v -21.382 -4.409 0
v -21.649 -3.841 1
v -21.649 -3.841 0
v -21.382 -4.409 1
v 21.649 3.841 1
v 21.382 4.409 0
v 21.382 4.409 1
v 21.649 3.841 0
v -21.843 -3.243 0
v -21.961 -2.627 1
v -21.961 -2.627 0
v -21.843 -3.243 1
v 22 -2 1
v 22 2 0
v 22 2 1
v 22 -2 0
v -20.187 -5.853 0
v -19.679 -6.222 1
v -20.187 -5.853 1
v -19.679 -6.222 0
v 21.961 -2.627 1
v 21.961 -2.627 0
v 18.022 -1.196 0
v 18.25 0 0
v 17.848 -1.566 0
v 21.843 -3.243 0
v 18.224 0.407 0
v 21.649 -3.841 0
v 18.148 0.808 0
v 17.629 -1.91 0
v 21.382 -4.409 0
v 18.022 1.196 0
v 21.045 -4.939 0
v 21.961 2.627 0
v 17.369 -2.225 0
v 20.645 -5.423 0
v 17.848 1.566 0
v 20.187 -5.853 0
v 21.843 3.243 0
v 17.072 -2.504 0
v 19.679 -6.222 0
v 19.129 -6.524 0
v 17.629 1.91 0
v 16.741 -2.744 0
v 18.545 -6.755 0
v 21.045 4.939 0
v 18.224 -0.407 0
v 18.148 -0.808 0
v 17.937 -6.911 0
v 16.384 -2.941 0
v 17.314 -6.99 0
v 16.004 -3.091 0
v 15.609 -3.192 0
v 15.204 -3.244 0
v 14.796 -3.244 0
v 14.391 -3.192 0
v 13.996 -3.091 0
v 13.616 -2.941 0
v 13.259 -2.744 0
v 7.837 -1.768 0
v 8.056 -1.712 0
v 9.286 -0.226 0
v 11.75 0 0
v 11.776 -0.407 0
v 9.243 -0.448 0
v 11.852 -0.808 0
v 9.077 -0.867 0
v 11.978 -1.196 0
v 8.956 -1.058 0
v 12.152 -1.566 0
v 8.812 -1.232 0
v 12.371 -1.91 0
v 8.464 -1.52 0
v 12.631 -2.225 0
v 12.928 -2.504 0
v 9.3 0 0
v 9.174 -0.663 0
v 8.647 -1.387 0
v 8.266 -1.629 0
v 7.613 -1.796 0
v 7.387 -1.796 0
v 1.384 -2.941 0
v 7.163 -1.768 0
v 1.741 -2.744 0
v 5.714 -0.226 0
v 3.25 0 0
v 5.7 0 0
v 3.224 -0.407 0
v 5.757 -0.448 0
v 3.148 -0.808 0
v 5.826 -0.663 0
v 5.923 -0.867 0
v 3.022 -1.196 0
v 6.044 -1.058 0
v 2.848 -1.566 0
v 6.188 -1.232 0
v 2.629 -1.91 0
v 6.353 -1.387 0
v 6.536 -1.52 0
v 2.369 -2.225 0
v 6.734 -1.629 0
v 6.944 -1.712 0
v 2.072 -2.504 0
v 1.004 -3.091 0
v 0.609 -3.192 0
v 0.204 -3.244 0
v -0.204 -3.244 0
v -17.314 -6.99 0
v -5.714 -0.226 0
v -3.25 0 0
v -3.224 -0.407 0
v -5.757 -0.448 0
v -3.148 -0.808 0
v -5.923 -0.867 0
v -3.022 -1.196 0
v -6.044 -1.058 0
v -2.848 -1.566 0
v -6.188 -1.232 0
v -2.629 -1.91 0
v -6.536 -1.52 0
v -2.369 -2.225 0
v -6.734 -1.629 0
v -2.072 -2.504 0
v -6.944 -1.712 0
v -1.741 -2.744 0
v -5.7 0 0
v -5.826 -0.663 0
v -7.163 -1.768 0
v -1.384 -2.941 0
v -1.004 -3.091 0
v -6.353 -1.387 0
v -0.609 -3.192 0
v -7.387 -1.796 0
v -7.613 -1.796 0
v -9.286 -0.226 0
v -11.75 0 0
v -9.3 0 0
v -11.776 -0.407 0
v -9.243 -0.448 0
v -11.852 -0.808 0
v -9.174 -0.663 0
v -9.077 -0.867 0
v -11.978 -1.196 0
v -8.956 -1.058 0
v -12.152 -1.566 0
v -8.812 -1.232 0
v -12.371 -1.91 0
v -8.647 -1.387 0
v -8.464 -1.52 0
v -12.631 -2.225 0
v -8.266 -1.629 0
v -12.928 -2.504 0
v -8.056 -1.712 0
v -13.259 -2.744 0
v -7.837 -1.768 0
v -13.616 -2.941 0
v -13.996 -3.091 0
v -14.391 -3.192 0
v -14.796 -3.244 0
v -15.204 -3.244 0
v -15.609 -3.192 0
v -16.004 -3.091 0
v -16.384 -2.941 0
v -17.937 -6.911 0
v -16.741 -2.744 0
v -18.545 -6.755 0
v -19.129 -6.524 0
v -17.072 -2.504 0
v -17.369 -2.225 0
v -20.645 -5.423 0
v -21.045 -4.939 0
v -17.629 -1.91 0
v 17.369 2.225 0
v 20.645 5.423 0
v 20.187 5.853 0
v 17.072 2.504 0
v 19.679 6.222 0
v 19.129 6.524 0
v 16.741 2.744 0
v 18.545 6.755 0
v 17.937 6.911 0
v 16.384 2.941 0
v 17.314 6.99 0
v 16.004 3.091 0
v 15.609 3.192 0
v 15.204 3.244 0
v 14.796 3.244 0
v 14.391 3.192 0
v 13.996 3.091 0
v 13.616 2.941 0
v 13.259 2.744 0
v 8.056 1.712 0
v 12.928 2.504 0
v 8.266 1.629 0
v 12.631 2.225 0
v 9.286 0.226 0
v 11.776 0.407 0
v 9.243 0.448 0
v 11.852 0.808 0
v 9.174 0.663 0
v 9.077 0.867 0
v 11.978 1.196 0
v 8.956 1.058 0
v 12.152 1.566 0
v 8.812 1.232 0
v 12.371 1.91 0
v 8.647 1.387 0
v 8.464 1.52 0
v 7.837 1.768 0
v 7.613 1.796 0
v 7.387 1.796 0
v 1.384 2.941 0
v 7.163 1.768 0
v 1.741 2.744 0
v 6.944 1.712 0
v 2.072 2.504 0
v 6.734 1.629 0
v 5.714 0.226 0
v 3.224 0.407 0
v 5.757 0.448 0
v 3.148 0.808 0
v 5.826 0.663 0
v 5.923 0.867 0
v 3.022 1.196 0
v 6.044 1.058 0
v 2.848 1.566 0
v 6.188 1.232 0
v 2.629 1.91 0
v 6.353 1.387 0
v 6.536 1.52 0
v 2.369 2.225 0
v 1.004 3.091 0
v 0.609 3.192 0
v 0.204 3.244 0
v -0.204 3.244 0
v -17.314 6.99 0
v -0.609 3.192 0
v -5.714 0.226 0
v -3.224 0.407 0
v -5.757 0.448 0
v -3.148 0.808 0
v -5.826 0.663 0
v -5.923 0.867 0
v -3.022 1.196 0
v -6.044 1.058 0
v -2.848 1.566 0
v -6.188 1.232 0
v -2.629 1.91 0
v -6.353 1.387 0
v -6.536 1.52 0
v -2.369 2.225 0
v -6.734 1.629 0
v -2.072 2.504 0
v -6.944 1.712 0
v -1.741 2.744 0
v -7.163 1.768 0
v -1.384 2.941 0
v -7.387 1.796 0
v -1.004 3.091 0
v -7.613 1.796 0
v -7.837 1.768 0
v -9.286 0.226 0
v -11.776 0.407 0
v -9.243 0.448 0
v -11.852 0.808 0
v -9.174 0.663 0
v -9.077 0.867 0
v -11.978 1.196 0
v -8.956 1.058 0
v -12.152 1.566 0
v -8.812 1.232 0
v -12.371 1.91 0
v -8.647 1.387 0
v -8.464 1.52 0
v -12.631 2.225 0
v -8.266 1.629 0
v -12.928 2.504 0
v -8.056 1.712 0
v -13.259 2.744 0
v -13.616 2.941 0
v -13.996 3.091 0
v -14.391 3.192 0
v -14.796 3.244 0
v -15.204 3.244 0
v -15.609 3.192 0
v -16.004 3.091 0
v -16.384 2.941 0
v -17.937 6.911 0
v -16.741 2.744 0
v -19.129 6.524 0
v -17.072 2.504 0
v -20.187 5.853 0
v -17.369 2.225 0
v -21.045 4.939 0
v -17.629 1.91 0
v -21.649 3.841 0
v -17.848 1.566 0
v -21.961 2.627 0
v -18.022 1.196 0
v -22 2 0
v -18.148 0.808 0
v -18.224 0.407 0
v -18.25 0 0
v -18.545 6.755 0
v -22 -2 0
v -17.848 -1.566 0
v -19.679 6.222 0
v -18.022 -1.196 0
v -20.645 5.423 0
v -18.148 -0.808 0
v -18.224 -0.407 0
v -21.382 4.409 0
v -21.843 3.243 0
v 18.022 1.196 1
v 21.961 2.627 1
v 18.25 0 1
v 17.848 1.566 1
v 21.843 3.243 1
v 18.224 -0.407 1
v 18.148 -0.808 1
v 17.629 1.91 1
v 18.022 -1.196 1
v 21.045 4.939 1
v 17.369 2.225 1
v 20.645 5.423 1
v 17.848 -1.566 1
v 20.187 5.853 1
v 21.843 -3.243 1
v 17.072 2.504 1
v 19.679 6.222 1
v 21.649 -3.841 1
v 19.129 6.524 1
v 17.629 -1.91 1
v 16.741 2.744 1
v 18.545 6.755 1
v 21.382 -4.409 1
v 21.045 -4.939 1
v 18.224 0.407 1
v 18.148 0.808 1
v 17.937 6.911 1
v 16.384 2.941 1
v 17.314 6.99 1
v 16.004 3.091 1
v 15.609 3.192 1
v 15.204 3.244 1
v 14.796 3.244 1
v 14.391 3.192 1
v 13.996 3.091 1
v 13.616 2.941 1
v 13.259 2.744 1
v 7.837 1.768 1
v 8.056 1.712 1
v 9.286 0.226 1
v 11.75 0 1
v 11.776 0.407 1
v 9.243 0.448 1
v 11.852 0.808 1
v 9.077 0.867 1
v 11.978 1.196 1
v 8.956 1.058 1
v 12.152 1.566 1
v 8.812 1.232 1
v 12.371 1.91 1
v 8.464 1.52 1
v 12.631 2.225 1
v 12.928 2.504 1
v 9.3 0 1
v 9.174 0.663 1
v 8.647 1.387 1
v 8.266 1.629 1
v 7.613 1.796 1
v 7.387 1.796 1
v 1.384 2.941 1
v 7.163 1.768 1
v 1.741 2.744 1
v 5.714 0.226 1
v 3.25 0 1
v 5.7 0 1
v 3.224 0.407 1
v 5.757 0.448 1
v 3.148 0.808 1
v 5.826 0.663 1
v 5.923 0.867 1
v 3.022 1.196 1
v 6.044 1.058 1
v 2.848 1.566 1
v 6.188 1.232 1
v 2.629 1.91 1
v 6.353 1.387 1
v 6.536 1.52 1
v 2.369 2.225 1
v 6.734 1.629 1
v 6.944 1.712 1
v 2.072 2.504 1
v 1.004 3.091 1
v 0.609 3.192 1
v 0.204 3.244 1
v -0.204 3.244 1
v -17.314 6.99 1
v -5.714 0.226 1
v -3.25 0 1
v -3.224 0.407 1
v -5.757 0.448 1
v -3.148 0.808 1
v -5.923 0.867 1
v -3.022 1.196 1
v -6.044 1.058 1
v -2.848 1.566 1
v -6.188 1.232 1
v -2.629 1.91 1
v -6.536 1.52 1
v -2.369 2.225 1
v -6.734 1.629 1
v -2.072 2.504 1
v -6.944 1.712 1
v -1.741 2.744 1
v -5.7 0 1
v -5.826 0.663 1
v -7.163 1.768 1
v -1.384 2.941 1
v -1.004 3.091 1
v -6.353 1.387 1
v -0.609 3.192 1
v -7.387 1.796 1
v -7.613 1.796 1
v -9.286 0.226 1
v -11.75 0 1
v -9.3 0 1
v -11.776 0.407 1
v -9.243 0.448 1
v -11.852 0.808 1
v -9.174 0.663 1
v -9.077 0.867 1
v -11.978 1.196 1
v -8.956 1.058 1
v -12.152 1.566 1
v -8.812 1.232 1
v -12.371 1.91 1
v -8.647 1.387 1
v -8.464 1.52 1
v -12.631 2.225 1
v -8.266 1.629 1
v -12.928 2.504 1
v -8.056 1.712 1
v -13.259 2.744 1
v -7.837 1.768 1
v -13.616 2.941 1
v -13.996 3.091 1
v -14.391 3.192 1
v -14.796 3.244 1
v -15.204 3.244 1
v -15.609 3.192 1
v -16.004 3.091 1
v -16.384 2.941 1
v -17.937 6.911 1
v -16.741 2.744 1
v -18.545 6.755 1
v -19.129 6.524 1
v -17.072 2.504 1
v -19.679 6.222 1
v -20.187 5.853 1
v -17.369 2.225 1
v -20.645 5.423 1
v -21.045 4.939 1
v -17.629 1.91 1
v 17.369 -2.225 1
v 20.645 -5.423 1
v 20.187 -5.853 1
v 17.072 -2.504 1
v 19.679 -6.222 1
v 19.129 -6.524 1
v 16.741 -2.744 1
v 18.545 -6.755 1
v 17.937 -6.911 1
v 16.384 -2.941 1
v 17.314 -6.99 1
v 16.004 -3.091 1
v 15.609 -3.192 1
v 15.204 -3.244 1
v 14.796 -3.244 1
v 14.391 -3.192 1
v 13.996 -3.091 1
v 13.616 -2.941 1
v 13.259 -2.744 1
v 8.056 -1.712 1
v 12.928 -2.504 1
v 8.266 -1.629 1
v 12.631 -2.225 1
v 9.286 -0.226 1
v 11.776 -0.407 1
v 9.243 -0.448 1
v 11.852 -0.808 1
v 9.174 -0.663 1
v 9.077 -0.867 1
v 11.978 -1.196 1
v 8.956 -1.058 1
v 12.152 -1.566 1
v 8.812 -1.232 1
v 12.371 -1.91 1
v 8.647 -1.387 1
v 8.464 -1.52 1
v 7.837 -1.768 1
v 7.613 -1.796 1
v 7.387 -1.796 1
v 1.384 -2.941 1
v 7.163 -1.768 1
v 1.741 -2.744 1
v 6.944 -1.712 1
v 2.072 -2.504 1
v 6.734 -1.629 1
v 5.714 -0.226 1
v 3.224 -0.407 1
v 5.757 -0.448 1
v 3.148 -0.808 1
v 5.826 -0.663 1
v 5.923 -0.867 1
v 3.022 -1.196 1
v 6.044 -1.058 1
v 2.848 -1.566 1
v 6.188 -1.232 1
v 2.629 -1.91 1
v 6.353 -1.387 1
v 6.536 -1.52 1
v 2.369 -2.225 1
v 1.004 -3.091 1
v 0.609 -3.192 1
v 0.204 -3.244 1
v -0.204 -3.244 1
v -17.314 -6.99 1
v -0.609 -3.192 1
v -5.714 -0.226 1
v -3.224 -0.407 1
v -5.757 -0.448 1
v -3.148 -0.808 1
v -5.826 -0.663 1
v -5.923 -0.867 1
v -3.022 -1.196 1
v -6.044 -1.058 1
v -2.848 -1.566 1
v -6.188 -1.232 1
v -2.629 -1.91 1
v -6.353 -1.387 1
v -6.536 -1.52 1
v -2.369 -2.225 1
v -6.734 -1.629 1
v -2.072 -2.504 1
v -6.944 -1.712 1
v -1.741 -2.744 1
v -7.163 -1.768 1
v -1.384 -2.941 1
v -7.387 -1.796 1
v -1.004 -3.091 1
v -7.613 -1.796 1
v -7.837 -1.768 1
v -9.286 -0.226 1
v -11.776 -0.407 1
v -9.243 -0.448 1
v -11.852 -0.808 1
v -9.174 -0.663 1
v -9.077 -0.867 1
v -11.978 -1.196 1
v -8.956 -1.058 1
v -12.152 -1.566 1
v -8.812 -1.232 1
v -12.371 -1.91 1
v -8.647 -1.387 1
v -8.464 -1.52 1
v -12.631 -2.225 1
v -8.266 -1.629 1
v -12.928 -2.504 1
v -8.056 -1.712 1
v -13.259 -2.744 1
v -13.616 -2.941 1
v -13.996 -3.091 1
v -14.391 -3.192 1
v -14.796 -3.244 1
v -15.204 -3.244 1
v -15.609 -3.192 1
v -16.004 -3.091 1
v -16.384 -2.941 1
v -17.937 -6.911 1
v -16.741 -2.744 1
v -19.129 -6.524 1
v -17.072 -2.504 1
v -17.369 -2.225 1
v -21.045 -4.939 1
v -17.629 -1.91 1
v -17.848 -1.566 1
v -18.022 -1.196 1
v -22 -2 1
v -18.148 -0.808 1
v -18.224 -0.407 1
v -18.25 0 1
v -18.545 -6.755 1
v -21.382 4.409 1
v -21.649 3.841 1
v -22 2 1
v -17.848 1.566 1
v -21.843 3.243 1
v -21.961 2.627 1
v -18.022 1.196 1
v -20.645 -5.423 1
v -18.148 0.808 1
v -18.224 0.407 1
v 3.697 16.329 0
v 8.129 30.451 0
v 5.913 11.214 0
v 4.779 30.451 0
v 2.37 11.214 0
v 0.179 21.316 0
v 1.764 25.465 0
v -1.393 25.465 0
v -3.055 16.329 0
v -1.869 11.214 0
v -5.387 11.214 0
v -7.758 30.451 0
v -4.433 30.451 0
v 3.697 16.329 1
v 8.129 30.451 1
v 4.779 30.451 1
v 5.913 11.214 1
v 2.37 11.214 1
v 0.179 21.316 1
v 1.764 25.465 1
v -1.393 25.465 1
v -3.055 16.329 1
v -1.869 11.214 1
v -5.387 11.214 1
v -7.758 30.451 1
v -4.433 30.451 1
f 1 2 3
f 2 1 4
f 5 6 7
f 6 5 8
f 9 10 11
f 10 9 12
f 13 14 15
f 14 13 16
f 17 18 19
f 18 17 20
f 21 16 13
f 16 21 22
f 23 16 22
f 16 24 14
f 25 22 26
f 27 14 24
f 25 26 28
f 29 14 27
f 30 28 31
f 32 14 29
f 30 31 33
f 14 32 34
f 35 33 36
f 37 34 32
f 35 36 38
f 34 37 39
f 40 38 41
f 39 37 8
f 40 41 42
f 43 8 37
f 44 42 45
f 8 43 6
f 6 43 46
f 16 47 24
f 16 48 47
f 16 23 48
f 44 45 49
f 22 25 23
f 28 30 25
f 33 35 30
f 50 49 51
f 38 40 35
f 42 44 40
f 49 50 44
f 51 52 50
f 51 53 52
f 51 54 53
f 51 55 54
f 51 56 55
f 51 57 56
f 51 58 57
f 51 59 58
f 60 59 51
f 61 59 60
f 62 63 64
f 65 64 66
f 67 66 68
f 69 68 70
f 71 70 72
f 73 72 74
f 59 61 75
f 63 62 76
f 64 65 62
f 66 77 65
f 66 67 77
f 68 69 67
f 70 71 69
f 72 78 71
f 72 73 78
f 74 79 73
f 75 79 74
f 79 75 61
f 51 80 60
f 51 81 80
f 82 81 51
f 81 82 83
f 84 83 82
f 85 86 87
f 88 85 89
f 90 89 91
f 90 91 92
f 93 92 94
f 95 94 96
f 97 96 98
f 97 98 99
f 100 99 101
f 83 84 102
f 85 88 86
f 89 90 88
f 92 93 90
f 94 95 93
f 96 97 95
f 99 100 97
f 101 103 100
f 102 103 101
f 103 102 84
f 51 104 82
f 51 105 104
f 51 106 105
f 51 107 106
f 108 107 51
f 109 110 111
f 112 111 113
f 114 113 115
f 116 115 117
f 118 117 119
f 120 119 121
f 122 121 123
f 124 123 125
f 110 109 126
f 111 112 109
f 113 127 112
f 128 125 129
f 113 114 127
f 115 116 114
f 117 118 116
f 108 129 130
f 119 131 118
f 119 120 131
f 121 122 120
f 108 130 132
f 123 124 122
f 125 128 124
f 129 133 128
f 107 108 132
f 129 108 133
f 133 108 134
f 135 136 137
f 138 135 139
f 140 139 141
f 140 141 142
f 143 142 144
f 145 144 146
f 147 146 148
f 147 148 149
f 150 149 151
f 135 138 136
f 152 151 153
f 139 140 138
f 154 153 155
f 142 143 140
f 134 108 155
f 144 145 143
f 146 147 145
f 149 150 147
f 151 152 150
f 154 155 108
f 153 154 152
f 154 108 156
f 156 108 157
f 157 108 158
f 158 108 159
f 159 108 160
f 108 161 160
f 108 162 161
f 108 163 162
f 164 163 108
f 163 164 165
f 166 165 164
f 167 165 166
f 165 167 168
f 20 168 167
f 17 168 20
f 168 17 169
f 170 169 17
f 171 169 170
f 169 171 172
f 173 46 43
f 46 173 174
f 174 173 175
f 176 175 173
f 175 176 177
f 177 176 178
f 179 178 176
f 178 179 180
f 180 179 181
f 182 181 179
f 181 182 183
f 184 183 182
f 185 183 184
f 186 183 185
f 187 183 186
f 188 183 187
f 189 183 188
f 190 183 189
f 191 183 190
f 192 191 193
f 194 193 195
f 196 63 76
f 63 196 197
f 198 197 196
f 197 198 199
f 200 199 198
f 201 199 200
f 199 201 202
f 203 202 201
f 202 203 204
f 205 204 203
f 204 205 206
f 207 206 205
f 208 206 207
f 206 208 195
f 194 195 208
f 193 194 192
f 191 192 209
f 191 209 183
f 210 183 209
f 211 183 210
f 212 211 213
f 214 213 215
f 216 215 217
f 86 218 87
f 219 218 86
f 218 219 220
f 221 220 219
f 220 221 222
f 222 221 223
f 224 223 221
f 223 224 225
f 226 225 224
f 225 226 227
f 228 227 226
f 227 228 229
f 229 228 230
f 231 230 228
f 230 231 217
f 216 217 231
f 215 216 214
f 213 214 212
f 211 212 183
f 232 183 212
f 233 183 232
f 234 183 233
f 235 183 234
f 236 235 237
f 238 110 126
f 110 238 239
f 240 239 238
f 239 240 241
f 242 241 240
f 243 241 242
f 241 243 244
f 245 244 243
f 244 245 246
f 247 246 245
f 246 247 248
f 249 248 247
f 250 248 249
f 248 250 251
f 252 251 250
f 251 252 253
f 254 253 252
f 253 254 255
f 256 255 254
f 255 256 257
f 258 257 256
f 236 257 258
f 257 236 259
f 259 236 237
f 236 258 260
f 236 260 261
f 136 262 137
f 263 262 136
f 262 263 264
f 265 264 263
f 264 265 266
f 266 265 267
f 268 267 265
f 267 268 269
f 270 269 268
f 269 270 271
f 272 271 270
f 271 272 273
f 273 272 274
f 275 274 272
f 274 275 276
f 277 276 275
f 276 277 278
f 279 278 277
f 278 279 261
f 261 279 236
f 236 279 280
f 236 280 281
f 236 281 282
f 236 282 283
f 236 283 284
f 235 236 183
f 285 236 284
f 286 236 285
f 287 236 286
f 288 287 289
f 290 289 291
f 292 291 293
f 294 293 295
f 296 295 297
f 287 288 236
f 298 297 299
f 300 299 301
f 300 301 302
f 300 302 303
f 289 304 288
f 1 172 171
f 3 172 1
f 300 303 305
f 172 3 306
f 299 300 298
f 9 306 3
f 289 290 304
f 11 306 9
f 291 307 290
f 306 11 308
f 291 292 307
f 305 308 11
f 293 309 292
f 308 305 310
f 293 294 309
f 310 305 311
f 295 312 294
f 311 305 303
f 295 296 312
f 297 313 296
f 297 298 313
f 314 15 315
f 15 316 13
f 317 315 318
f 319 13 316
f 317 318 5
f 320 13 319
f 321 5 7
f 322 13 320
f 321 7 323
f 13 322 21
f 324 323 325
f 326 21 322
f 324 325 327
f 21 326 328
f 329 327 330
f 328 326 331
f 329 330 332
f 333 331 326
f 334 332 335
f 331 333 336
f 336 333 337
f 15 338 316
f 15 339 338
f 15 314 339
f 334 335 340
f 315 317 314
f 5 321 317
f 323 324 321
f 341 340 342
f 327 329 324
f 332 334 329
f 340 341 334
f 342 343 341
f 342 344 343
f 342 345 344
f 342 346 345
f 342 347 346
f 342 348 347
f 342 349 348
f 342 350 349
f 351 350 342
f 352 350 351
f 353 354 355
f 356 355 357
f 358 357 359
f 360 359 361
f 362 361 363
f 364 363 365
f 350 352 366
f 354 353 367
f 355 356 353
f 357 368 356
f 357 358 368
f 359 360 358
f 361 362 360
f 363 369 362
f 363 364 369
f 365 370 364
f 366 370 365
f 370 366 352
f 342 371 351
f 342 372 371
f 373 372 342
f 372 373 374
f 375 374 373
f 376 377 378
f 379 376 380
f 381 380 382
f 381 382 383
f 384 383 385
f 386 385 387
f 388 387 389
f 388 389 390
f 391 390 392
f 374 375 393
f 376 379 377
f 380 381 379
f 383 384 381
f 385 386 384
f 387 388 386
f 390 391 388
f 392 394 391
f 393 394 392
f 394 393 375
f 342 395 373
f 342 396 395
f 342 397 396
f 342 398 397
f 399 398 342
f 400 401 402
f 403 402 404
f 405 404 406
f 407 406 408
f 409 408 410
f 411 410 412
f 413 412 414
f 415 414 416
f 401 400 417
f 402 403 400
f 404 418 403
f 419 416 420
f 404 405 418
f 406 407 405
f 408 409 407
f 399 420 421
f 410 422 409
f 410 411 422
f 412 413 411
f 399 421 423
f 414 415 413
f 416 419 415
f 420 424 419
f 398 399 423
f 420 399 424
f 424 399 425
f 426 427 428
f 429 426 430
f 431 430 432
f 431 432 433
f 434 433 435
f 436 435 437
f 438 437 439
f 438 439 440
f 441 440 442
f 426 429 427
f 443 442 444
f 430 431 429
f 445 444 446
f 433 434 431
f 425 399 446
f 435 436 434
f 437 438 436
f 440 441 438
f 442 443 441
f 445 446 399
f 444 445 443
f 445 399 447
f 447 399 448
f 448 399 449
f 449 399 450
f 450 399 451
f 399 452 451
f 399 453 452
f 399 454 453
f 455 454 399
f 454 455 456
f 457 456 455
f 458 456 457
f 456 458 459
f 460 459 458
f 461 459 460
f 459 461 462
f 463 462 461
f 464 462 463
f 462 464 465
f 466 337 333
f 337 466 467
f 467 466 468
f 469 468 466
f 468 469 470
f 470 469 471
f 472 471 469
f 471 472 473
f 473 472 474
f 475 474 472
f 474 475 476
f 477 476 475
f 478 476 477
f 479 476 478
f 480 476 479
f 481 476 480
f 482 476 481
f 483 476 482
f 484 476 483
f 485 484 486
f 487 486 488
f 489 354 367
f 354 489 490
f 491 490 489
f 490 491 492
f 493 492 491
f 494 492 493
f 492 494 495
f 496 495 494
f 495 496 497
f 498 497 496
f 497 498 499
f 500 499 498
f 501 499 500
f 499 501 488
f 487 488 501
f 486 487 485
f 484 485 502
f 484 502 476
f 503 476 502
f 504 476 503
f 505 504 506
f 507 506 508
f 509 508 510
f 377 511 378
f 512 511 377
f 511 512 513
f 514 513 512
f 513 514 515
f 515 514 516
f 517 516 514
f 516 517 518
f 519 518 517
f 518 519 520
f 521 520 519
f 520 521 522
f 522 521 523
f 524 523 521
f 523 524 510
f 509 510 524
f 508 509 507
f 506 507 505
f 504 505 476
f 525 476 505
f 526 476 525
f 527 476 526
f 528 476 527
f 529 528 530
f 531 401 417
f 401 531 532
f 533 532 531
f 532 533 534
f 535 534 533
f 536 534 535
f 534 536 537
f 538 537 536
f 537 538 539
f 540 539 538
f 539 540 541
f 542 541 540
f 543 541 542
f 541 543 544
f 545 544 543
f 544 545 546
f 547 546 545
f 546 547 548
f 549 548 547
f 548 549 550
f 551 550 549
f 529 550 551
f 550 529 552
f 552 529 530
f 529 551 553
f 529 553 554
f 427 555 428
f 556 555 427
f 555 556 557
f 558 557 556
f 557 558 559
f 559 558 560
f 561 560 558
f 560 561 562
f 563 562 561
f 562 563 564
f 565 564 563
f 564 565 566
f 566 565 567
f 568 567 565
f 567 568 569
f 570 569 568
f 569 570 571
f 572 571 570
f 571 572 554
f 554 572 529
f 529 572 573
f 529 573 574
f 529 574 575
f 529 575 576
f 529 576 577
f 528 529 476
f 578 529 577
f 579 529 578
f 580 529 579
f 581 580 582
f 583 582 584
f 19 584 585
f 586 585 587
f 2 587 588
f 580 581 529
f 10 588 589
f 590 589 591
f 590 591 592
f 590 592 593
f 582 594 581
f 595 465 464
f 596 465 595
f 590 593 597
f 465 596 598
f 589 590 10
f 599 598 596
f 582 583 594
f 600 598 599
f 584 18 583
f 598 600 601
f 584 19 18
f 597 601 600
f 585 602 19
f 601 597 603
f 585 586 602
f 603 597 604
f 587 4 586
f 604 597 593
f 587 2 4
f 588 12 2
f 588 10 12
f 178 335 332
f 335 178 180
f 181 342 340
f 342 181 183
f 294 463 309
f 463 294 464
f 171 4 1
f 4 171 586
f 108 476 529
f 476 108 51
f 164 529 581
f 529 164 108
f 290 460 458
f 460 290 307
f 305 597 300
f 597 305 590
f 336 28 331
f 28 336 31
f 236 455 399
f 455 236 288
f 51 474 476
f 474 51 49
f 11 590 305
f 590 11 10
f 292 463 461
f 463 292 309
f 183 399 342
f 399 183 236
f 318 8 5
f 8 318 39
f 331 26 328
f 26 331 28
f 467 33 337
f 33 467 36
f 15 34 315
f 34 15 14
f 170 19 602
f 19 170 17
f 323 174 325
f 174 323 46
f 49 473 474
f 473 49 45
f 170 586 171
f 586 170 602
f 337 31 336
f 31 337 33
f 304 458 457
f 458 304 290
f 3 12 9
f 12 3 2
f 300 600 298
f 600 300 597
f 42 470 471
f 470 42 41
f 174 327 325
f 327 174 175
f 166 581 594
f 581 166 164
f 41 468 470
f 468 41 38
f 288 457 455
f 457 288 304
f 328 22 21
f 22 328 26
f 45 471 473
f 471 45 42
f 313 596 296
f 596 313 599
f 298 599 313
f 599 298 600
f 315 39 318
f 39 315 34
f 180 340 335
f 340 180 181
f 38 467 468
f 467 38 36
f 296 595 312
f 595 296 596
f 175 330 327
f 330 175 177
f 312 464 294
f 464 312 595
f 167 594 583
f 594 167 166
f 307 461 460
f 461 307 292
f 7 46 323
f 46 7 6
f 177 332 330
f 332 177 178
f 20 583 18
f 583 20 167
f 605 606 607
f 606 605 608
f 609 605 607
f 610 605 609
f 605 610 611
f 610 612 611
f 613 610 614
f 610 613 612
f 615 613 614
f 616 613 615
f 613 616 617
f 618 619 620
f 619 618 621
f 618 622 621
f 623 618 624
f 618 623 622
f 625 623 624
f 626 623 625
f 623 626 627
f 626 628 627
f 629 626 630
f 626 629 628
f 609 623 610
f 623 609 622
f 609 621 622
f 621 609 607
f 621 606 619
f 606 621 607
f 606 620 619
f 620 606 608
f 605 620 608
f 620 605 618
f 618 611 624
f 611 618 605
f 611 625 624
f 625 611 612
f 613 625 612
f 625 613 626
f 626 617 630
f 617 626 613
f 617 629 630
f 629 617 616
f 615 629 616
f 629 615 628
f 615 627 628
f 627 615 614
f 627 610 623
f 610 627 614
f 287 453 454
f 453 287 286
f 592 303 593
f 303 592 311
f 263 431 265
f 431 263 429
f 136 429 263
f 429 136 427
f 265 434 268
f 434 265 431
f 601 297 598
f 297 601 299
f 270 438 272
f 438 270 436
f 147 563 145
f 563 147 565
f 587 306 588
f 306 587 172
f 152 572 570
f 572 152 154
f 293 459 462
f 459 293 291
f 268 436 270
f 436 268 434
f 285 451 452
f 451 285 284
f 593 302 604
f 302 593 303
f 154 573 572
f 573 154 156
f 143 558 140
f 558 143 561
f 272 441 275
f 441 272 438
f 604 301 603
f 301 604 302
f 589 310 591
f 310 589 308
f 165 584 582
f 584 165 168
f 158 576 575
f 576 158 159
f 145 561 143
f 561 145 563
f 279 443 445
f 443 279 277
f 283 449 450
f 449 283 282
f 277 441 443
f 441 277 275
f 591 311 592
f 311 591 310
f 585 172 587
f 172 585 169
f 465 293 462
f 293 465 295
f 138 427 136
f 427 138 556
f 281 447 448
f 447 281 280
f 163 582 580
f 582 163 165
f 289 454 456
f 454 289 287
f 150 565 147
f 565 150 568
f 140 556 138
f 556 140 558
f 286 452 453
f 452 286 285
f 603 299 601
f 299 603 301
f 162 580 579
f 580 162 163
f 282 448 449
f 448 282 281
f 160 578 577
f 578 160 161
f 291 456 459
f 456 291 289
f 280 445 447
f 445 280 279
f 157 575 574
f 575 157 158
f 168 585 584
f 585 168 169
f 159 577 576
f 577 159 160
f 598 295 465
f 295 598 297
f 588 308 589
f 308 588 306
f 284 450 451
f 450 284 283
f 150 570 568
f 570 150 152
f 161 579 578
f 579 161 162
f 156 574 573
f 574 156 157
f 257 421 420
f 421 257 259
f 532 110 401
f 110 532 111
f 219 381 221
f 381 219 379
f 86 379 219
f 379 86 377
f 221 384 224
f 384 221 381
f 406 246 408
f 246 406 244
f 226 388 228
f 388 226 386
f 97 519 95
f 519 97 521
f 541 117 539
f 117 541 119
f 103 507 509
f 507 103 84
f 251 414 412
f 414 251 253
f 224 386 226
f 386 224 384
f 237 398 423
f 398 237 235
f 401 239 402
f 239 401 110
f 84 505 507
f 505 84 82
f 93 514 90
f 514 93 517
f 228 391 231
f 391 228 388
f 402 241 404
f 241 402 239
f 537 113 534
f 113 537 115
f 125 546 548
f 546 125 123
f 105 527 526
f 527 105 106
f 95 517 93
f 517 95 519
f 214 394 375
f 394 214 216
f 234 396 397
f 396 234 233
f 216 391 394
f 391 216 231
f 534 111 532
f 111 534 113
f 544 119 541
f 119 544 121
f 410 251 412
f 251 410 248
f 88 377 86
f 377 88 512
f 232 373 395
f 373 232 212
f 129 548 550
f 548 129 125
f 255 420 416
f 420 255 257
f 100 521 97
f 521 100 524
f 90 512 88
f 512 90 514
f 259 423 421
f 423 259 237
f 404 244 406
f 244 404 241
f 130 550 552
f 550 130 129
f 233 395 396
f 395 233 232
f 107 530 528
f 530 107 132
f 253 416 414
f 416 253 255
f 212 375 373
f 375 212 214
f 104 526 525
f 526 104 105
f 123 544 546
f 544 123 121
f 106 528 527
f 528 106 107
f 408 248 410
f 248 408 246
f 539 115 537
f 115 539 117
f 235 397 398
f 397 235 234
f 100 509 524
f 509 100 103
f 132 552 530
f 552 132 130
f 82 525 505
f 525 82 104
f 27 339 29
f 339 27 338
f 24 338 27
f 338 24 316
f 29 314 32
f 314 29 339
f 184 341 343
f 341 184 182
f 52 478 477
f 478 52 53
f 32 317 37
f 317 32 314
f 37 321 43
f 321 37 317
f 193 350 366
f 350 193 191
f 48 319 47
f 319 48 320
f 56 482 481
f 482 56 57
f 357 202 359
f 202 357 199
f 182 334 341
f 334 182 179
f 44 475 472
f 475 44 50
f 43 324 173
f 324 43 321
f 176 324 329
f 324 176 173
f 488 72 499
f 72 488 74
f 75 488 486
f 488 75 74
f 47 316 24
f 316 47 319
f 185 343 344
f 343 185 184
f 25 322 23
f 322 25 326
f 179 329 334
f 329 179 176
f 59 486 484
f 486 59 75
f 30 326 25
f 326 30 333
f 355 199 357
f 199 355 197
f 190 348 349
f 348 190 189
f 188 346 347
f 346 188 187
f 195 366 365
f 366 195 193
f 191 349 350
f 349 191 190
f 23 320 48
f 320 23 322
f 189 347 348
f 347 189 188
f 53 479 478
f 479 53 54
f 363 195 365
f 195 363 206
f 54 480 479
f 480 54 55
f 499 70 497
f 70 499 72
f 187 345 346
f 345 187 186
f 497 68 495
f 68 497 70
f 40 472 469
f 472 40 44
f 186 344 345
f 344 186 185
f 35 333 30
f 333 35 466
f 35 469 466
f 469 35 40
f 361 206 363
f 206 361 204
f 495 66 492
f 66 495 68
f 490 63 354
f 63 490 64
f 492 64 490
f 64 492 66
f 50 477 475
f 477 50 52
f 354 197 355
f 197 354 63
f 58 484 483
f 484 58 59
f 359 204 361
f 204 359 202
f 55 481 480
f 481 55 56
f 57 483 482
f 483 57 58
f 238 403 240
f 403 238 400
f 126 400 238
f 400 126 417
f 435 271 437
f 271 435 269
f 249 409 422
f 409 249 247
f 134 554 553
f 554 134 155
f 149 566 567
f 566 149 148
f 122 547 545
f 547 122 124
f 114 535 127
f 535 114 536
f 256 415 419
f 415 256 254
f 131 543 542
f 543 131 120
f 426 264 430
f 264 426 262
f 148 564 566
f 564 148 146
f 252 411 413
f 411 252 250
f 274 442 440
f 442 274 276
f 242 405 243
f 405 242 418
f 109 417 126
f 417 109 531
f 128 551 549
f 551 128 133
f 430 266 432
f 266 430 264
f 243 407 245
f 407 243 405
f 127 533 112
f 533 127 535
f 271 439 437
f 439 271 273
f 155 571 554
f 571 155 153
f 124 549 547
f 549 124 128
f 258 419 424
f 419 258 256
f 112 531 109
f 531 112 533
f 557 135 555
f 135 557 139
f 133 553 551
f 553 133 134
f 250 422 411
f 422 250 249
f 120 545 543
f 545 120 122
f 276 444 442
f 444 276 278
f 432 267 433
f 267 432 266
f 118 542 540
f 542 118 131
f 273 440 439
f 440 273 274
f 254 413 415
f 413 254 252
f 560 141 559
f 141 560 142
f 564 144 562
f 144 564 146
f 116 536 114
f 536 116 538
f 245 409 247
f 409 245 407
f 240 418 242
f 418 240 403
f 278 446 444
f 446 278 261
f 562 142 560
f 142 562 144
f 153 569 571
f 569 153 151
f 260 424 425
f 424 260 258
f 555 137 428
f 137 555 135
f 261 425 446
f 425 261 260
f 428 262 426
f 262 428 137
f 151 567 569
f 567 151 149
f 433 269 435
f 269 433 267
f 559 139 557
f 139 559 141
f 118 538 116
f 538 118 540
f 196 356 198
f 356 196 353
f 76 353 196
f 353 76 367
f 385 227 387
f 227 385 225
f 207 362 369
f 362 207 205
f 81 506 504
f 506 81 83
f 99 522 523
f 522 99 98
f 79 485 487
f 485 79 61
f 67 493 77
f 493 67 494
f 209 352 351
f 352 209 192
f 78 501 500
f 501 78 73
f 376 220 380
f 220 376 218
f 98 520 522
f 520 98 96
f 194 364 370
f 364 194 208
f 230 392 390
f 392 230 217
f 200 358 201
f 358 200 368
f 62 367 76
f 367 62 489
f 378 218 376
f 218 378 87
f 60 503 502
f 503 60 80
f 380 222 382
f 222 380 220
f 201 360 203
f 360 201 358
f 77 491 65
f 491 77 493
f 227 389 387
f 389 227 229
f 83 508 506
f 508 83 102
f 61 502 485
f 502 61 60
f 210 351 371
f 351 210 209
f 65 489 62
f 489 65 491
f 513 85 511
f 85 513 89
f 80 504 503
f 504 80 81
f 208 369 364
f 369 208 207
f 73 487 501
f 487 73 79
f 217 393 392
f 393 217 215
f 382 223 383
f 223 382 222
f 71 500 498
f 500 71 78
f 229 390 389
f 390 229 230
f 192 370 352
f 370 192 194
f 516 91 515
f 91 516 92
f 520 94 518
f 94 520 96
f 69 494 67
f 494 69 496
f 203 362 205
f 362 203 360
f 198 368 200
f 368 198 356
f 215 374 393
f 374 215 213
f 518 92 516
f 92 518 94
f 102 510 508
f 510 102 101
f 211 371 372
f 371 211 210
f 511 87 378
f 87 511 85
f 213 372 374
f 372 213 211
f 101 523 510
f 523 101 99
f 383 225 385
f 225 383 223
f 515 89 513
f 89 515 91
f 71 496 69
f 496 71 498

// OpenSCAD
$fn = 50;


difference() {
	union() {
		hull() {
			translate(v = [-17.0000000000, 2.0000000000, 0]) {
				cylinder(h = 1, r = 5);
			}
			translate(v = [17.0000000000, 2.0000000000, 0]) {
				cylinder(h = 1, r = 5);
			}
			translate(v = [-17.0000000000, -2.0000000000, 0]) {
				cylinder(h = 1, r = 5);
			}
			translate(v = [17.0000000000, -2.0000000000, 0]) {
				cylinder(h = 1, r = 5);
			}
		}
		translate(v = [0, 30.0000000000, 0]) {
			linear_extrude(height = 1) {
				text(font = "DejaVu Sans Mono:style=Bold", halign = "center", size = 19.0000000000, text = "W", valign = "top");
			}
		}
	}
	union() {
		translate(v = [-15.0000000000, 0.0000000000, 0]) {
			translate(v = [0, 0, -100]) {
				cylinder(h = 200, r = 3.2500000000);
			}
		}
		translate(v = [0, 0, -100]) {
			cylinder(h = 200, r = 3.2500000000);
		}
		translate(v = [15.0000000000, 0.0000000000, 0]) {
			translate(v = [0, 0, -100]) {
				cylinder(h = 200, r = 3.2500000000);
			}
		}
		translate(v = [-15.0000000000, 0.0000000000, 0]) {
			translate(v = [0, 0, -100]) {
				cylinder(h = 200, r = 1.8000000000);
			}
		}
		translate(v = [-7.5000000000, 0.0000000000, 0]) {
			translate(v = [0, 0, -100]) {
				cylinder(h = 200, r = 1.8000000000);
			}
		}
		translate(v = [0, 0, -100]) {
			cylinder(h = 200, r = 1.8000000000);
		}
		translate(v = [7.5000000000, 0.0000000000, 0]) {
			translate(v = [0, 0, -100]) {
				cylinder(h = 200, r = 1.8000000000);
			}
		}
		translate(v = [15.0000000000, 0.0000000000, 0]) {
			translate(v = [0, 0, -100]) {
				cylinder(h = 200, r = 1.8000000000);
			}
		}
	}
}
